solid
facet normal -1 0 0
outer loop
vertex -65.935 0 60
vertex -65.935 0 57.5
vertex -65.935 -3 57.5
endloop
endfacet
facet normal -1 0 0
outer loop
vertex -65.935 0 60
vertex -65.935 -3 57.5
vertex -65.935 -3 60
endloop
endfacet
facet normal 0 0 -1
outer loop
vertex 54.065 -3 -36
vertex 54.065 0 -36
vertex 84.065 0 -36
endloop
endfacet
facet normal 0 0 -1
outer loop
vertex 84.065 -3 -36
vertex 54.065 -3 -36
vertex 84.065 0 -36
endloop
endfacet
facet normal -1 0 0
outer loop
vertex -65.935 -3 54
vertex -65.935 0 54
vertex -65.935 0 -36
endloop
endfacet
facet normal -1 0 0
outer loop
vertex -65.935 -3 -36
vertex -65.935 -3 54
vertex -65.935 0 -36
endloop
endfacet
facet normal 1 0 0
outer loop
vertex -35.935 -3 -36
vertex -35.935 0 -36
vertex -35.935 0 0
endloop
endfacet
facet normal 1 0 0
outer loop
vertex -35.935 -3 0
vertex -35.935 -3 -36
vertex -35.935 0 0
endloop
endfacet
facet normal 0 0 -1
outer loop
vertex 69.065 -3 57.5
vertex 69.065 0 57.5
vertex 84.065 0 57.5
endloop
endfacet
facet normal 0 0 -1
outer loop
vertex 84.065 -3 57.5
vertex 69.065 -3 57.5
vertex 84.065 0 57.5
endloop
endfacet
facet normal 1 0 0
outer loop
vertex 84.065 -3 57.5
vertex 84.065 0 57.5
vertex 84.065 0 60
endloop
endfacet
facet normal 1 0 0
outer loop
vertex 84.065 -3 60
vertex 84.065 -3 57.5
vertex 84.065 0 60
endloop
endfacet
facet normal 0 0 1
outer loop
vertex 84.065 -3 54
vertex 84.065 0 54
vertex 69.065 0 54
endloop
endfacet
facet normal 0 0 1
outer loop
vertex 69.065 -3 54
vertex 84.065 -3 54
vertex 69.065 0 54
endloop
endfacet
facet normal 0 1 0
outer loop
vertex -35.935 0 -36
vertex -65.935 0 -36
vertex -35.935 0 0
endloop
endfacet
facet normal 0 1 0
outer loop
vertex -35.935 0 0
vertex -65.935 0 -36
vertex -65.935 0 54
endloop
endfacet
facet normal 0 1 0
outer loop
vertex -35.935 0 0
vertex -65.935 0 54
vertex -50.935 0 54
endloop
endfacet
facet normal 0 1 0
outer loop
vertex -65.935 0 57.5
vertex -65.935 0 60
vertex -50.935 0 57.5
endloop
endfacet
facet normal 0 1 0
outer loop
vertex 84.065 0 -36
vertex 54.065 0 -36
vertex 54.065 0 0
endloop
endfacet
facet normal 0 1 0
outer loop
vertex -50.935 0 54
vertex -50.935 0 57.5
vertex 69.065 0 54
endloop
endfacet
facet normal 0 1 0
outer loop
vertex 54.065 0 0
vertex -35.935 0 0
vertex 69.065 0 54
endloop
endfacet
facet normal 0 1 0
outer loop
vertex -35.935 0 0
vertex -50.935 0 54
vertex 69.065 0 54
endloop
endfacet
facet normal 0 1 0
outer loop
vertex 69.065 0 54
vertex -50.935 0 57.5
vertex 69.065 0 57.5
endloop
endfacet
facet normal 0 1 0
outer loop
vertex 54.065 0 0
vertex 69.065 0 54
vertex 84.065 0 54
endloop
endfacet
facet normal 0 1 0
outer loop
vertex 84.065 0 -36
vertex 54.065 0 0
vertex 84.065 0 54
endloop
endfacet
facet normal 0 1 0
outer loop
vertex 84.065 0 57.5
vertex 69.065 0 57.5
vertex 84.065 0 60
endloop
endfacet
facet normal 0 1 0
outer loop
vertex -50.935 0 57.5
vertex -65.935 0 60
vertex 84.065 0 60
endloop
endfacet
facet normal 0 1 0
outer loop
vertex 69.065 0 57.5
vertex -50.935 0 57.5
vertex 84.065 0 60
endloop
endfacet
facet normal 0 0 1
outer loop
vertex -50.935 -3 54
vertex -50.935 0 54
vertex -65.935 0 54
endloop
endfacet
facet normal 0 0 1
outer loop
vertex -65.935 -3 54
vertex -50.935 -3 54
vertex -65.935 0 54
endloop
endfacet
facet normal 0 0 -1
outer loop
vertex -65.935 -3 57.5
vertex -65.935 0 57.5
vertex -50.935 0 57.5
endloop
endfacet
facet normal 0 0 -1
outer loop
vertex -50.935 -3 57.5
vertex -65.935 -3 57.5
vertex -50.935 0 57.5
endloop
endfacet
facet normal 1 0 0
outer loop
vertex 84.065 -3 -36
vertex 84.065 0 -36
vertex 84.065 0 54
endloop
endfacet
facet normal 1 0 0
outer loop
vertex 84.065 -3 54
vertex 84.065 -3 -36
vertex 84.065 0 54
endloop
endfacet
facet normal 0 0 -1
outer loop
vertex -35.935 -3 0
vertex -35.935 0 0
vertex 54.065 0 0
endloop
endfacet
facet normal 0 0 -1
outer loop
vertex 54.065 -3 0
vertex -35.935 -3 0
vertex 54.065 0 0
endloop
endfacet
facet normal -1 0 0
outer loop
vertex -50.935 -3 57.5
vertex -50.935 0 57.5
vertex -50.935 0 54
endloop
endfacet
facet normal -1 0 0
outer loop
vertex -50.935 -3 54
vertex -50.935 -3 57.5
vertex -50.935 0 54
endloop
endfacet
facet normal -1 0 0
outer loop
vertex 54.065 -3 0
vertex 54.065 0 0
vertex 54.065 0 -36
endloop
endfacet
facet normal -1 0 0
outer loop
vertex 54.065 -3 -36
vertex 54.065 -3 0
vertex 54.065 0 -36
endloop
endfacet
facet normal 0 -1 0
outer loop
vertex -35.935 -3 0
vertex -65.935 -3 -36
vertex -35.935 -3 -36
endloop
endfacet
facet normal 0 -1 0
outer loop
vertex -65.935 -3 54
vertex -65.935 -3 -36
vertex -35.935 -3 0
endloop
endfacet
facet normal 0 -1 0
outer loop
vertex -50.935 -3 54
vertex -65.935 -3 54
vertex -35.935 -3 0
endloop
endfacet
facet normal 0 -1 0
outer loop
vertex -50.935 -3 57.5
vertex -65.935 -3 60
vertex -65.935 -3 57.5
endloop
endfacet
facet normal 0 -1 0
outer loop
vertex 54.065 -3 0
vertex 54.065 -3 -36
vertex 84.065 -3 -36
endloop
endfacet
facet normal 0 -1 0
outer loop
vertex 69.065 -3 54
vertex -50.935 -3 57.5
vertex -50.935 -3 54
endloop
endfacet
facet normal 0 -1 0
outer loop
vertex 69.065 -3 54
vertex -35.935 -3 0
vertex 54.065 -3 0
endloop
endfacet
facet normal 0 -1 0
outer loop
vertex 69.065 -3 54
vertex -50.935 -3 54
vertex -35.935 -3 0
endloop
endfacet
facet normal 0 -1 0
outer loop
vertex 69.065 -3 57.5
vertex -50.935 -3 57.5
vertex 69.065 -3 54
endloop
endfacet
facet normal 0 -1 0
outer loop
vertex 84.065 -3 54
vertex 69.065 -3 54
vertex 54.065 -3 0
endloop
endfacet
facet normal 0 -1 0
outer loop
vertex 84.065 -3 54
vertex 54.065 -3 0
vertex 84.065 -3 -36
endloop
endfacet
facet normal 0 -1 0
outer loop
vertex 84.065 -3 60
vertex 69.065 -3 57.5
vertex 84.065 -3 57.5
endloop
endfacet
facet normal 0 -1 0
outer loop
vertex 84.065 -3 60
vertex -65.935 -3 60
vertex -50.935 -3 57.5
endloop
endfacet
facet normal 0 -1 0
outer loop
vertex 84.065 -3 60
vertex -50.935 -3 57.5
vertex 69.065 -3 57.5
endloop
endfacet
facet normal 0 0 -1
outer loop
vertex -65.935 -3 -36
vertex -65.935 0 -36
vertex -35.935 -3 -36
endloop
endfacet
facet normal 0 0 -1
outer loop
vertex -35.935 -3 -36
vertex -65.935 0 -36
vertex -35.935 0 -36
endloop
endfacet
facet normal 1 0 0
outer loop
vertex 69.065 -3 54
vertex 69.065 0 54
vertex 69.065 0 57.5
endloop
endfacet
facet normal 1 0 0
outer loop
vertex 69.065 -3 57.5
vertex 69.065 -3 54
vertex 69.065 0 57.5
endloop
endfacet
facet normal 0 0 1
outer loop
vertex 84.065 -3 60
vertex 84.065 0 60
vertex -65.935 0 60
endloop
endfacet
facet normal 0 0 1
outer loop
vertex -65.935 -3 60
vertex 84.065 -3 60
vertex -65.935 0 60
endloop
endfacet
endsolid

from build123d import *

# Parameters (mm, degrees)
F0_W     = 15
F0_H     = 2.5
F1_DEPTH = 3


with BuildPart() as f1:
    # F0 (on Front) → F1 (new body)
    with BuildSketch(Plane.XZ):
        Polygon((54.065418, -36), (84.065418, -36), (84.065418, 54), (69.065418, 54), (69.065418, 57.5), (84.065418, 57.5), (84.065418, 60), (-50.934582, 60), (-50.934582, 57.5), (-50.934582, 54), (-65.934582, 54), (-65.934582, -36), (-35.934582, -36), (-35.934582, 0), (54.065418, 0), align=None)
        with Locations((-58.434582, 58.75)):
            Rectangle(F0_W, F0_H)
    extrude(amount=F1_DEPTH)


solid = f1.part
